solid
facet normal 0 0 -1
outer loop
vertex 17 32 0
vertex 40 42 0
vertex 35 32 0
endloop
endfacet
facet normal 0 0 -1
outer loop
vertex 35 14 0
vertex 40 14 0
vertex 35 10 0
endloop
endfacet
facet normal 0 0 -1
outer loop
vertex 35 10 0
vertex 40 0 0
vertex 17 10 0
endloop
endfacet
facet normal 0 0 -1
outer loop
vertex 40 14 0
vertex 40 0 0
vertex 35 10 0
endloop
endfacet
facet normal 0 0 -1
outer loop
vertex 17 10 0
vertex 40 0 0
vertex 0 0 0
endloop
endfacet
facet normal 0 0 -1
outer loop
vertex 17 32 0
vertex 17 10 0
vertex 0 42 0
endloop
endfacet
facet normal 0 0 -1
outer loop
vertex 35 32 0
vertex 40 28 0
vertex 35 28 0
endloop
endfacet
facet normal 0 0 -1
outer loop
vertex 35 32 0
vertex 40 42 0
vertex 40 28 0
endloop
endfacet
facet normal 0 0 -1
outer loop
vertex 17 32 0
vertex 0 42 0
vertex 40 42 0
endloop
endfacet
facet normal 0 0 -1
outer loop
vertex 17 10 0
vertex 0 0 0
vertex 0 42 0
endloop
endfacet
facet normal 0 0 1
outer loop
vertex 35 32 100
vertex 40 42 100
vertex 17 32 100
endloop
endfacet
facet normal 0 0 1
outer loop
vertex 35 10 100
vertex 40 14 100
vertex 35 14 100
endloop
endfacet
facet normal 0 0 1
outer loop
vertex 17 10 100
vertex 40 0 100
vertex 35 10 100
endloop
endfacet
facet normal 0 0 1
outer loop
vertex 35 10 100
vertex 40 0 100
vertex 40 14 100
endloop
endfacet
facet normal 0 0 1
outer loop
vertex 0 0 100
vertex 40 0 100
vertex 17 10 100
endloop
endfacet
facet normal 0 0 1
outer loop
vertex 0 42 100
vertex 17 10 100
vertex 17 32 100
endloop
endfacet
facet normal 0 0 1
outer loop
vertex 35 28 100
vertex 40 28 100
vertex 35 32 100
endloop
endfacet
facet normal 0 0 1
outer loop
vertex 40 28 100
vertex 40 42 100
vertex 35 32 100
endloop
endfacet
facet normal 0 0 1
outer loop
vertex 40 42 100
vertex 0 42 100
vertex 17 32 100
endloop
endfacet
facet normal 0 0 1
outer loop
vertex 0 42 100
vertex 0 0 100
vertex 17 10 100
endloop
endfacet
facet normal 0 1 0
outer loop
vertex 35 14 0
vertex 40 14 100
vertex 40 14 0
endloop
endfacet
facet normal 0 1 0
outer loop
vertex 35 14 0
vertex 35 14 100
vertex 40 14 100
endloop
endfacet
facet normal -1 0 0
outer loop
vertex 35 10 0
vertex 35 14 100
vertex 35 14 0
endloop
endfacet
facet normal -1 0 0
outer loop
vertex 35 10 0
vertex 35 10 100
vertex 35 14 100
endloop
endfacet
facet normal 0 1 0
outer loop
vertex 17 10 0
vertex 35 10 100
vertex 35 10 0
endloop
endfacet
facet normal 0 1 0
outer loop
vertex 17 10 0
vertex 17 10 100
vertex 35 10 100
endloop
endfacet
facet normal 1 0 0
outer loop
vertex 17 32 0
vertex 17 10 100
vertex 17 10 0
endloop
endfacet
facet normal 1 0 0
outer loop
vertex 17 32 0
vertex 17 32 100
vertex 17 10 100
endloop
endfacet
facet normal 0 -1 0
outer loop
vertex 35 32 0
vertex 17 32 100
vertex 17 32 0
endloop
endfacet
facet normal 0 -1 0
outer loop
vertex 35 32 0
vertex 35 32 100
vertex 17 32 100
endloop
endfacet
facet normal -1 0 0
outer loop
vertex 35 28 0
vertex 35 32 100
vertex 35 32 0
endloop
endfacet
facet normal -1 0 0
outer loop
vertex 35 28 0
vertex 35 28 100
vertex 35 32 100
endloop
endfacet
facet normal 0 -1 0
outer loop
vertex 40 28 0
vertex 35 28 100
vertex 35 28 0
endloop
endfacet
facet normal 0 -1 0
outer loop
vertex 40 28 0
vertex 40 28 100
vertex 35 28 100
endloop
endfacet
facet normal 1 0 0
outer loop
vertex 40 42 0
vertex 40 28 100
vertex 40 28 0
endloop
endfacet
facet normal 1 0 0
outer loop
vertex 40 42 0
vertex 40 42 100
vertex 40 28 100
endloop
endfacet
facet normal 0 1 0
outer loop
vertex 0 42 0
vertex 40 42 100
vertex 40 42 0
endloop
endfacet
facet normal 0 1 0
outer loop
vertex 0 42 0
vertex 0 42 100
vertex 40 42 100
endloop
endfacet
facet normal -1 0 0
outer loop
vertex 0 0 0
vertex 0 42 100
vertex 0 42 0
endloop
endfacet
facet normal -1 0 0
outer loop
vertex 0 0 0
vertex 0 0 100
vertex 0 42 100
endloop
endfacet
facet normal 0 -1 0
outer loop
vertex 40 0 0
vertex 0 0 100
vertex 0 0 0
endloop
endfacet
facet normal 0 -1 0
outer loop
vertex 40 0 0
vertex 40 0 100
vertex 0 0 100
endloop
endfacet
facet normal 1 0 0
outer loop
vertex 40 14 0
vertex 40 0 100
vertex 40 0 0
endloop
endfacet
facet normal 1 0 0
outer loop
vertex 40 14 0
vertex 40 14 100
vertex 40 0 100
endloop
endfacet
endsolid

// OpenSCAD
$fn = 32;

// ----------------------------------------------------------------------
// T-slot rail: 40 x 42 mm section, 100 mm long
// ----------------------------------------------------------------------

// --- parameters (mm) ---
profile_height = 100;     // extrusion height
profile_points = 12;      // points of the closed outline

profile = [[0, 0], [40, 0], [40, 14], [35, 14], [35, 10], [17, 10], [17, 32], [35, 32], [35, 28], [40, 28], [40, 42], [0, 42]];  // single closed polygon, 12 points, counter clockwise

// --- the one profile operation ---
linear_extrude(height = profile_height) polygon(points = profile);
